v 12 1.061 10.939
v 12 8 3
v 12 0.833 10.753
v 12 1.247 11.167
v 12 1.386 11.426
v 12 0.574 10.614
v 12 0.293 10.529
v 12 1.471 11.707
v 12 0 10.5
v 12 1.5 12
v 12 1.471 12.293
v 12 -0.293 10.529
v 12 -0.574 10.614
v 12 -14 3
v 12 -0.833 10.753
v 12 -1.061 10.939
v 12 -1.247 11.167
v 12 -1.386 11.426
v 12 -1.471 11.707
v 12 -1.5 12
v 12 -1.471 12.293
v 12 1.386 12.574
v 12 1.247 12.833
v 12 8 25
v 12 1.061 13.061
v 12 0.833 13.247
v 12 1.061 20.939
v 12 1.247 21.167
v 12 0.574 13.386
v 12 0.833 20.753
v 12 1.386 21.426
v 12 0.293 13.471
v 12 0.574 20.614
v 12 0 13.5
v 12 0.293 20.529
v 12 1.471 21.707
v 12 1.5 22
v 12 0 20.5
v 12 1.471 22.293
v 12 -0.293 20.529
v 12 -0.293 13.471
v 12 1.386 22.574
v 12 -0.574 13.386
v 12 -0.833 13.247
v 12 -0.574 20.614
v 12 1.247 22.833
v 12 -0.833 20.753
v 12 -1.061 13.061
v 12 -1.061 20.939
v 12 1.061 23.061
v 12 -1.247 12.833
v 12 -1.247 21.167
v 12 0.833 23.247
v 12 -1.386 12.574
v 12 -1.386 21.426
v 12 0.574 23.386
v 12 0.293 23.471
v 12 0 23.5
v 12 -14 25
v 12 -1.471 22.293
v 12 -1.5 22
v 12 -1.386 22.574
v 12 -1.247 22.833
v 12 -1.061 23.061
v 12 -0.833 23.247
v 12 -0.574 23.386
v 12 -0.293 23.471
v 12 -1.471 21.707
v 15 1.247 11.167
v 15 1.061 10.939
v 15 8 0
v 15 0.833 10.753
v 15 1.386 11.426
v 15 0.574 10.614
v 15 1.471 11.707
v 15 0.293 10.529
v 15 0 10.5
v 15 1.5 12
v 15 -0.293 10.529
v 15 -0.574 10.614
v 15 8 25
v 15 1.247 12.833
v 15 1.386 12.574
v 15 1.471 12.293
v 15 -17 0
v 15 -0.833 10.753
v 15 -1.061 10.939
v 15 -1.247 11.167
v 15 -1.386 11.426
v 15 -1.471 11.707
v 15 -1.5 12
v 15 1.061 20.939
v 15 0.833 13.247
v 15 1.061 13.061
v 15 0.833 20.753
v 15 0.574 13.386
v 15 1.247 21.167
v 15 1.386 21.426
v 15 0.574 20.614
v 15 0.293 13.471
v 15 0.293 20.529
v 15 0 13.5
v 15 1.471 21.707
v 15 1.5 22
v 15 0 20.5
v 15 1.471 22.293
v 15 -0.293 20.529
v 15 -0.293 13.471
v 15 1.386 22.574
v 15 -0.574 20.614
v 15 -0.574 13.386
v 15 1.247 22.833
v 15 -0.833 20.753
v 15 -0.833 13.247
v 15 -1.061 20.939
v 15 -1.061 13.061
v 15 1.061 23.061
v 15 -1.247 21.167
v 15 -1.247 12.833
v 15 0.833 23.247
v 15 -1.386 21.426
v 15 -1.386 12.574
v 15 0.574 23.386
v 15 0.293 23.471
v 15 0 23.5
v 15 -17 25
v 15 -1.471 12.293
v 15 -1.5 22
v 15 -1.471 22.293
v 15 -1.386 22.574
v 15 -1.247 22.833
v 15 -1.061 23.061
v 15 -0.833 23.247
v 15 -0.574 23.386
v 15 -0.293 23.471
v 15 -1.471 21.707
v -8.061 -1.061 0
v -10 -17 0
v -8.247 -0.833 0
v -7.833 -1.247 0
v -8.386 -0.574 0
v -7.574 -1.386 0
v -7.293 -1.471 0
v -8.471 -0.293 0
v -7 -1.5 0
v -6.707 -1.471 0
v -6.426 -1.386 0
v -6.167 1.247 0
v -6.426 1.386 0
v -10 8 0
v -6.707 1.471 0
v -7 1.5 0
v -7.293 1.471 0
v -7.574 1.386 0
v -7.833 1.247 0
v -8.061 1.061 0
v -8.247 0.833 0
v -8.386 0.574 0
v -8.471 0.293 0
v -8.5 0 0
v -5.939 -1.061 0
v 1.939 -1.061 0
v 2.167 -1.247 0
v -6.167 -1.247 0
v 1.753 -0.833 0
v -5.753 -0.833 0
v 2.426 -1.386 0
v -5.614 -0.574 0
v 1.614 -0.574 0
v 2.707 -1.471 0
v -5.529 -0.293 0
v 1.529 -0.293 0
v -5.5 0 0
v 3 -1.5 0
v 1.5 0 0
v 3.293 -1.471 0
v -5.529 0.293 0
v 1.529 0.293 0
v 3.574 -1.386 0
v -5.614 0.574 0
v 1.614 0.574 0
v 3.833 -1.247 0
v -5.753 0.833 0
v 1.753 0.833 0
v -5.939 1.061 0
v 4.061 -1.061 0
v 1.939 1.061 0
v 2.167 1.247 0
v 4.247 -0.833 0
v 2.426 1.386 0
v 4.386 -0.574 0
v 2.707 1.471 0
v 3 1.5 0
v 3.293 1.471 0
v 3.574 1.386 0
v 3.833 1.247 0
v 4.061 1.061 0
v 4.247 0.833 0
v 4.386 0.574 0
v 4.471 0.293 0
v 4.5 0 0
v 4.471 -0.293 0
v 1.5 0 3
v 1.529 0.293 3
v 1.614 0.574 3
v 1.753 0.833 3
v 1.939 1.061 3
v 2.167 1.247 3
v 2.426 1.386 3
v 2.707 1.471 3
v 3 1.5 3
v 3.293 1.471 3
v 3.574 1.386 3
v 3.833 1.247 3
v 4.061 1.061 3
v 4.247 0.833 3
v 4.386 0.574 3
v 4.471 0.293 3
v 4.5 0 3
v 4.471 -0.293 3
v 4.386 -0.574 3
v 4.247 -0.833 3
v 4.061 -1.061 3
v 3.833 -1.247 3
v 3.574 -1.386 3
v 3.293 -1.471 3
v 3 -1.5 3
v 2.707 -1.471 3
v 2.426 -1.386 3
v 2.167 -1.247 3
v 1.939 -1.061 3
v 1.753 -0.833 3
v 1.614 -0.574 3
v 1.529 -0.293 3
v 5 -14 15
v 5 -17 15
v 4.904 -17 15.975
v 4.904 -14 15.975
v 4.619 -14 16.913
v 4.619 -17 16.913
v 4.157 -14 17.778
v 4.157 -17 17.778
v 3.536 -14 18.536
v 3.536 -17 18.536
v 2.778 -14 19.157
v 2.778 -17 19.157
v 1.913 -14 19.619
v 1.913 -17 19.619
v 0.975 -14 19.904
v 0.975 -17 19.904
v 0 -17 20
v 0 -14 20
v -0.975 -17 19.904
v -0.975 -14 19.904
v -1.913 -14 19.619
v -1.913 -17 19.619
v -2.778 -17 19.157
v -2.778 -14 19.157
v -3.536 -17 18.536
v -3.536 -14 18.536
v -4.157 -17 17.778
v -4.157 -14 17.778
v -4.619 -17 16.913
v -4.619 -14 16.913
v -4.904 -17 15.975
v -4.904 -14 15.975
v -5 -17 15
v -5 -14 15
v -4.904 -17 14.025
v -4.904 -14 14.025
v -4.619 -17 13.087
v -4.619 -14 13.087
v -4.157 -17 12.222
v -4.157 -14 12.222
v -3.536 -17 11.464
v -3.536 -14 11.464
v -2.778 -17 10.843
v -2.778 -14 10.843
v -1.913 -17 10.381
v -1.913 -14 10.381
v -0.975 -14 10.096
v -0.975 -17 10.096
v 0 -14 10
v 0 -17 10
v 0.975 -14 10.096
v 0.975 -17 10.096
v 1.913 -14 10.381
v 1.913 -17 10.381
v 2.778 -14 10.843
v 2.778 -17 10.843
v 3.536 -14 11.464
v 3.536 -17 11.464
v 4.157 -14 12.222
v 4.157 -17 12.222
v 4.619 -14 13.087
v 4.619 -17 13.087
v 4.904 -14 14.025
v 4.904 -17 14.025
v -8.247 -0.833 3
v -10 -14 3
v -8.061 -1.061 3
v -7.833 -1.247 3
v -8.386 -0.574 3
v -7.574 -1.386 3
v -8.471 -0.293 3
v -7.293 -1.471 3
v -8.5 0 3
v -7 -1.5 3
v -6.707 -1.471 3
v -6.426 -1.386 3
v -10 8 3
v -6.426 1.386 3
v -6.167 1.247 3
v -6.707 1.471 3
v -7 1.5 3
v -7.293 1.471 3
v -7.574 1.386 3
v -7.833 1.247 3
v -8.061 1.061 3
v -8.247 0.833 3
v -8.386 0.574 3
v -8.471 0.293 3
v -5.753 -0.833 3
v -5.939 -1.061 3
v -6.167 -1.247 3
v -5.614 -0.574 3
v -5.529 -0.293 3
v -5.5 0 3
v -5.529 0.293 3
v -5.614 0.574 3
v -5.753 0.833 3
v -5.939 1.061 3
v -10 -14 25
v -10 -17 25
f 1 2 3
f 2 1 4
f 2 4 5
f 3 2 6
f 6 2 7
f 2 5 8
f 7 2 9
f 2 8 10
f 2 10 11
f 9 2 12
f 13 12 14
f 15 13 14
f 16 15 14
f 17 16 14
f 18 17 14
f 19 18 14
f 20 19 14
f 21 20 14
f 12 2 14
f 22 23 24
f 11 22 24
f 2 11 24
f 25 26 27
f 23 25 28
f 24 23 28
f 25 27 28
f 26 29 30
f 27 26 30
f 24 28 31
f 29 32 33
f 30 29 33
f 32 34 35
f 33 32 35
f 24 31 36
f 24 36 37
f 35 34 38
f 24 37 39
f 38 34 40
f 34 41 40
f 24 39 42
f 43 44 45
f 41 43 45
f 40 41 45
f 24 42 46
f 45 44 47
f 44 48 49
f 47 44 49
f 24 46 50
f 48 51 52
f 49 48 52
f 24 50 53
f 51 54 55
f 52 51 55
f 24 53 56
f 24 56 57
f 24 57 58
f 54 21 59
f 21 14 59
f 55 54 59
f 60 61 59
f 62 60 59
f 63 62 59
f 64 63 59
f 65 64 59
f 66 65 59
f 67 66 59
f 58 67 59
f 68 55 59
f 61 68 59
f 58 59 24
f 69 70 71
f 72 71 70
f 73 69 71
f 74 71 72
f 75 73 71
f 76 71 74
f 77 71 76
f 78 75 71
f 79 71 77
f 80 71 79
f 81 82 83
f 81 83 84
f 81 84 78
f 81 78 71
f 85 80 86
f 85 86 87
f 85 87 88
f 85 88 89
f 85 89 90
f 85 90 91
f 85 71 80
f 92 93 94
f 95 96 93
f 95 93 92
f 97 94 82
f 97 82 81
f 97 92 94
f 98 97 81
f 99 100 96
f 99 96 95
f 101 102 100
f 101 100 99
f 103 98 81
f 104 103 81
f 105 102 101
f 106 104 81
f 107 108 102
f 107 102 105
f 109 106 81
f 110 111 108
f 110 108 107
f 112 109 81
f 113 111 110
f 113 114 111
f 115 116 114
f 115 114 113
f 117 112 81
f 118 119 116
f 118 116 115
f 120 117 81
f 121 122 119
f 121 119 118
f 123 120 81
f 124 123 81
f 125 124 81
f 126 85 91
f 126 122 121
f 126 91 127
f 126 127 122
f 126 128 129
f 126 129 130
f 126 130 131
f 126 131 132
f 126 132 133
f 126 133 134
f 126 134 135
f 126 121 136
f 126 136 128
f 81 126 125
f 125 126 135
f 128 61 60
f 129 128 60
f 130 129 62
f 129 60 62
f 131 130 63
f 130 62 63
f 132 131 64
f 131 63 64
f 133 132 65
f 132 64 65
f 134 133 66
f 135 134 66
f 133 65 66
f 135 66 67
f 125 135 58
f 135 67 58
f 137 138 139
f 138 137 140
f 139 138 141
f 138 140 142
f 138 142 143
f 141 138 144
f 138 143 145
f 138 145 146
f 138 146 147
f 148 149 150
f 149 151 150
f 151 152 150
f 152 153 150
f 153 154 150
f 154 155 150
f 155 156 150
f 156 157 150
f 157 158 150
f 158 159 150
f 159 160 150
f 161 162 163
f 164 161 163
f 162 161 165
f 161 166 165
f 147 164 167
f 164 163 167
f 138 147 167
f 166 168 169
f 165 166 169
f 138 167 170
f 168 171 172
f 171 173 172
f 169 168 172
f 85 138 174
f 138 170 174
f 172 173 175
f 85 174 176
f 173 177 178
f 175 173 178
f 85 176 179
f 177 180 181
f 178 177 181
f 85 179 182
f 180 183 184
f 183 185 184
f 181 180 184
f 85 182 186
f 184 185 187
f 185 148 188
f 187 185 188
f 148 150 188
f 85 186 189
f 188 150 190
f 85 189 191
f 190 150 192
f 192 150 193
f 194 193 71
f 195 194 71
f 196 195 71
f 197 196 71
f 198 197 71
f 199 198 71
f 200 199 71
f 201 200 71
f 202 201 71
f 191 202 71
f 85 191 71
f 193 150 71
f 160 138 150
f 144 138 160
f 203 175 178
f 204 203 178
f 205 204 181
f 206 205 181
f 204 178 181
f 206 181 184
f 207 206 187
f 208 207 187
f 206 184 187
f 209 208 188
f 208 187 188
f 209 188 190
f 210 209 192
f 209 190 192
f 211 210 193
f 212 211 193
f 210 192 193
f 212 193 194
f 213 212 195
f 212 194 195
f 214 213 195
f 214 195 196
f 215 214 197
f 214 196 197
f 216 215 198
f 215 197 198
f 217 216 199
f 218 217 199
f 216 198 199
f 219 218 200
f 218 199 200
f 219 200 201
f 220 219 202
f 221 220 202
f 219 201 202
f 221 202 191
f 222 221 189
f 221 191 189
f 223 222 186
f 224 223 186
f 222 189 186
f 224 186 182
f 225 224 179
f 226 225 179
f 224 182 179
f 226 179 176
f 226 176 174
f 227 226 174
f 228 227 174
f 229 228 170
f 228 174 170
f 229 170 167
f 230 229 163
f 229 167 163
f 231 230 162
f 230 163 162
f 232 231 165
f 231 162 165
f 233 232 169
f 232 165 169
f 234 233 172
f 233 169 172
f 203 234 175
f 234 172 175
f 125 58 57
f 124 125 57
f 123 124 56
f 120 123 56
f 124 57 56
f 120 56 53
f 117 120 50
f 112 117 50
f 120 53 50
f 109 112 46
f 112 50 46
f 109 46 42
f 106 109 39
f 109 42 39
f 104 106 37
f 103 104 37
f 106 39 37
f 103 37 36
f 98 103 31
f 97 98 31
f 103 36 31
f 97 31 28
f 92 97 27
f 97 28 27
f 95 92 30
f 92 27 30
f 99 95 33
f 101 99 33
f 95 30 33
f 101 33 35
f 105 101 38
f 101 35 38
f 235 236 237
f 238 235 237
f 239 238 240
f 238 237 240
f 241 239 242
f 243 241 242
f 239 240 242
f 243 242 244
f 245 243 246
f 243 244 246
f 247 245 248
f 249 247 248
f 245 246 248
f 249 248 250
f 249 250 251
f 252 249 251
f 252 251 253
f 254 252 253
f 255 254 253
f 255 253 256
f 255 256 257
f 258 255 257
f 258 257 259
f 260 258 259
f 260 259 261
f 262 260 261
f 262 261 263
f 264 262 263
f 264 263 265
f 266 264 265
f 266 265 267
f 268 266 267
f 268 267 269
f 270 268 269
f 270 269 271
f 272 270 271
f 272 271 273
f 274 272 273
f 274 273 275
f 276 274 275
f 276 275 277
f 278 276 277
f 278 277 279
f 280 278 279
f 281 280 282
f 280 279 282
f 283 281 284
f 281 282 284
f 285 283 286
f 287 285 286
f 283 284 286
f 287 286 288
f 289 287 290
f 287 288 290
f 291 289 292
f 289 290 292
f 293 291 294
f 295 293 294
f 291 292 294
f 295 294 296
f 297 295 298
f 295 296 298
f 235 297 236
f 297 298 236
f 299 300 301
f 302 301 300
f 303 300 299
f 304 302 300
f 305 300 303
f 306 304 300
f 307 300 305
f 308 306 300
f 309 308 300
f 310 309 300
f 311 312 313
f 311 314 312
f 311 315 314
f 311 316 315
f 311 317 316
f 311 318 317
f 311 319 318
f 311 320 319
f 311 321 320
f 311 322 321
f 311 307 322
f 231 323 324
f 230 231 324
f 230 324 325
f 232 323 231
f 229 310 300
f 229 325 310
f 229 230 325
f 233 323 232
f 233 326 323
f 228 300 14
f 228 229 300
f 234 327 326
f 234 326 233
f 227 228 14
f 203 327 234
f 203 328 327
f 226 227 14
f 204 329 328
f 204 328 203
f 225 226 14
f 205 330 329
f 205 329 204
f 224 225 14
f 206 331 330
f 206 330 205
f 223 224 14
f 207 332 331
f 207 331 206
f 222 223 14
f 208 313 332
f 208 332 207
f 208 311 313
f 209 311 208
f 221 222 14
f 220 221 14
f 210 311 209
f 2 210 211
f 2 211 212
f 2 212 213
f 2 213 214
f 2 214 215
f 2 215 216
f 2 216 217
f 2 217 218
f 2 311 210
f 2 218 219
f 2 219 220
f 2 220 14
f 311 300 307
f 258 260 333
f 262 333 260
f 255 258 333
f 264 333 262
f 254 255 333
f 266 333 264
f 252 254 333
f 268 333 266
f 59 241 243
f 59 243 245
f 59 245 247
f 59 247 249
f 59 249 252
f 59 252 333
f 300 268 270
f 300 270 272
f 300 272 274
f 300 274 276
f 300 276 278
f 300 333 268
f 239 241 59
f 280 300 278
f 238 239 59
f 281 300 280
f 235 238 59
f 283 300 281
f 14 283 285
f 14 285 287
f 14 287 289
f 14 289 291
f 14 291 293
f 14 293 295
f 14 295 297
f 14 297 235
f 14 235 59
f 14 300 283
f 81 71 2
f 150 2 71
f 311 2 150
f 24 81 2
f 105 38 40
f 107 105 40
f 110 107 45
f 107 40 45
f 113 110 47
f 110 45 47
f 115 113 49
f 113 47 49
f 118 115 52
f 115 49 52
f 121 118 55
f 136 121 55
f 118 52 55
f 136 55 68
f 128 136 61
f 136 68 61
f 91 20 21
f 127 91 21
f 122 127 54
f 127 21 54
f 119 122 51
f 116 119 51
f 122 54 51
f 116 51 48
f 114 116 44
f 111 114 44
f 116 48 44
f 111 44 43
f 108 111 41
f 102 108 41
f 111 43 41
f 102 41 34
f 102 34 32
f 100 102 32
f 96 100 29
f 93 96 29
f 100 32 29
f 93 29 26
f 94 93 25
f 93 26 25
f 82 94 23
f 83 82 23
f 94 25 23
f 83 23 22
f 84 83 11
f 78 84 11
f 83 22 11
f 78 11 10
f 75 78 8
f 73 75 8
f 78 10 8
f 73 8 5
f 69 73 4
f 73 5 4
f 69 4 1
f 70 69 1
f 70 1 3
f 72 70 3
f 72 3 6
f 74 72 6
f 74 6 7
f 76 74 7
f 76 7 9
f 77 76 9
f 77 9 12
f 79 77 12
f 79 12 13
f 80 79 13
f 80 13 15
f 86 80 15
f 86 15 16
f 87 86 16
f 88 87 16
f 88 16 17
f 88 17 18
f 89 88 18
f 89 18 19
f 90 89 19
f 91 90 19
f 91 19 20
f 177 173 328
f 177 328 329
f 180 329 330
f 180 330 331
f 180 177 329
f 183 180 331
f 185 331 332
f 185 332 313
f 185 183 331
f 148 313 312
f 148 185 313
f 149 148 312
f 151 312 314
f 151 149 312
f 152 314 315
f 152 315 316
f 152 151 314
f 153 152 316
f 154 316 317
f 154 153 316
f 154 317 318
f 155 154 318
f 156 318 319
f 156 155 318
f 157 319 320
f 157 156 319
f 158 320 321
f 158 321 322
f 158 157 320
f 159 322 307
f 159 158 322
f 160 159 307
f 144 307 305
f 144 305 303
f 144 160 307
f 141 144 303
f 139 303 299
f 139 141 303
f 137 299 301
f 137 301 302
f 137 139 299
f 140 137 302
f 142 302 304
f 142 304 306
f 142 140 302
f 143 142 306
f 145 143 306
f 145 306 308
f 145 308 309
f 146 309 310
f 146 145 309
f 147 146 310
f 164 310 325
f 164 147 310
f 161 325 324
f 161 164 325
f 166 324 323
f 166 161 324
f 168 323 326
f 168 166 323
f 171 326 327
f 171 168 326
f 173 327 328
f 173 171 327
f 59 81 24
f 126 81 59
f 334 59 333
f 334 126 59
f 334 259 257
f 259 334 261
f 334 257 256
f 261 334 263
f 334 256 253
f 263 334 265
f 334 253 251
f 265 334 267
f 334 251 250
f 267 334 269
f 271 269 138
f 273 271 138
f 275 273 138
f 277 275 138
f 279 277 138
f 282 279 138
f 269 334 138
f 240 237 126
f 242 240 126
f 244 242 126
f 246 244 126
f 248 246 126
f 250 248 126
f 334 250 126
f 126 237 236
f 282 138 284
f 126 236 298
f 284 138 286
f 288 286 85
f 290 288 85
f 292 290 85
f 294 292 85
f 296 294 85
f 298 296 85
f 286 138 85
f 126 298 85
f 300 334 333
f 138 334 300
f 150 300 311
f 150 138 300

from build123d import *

# Parameters (mm, degrees)
F0_W      = 25
F0_H      = 25
F0_R      = 1.5
F1_DEPTH  = 3
F2_DEPTH  = 3
F3_W      = 25
F3_H      = 3
F4_DEPTH  = 22
F5_W      = 3
F5_H      = 22
F6_DEPTH  = 22
F8_DEPTH  = 25
F9_R      = 5
F10_DEPTH = 25


with BuildPart() as f1:
    # F0 (on Top) → F1 (new body)
    with BuildSketch(Plane.XY):
        with Locations((2.5, -4.5)):
            Rectangle(F0_W, F0_H)
        with Locations((-7, 0)):
            Circle(F0_R, mode=Mode.SUBTRACT)
        with BuildLine():
            ThreePointArc((4.5, 0), (3, -1.5), (1.5, 0))
            ThreePointArc((1.5, 0), (3, 1.5), (4.5, 0))
        make_face(mode=Mode.SUBTRACT)
    extrude(amount=F1_DEPTH)

    # F0 (on Top) → F2 (join)
    with BuildSketch(Plane.XY):
        with Locations((2.5, -4.5)):
            Rectangle(F0_W, F0_H)
        with Locations((-7, 0)):
            Circle(F0_R, mode=Mode.SUBTRACT)
        with BuildLine():
            ThreePointArc((4.5, 0), (3, -1.5), (1.5, 0))
            ThreePointArc((1.5, 0), (3, 1.5), (4.5, 0))
        make_face(mode=Mode.SUBTRACT)
    extrude(amount=F2_DEPTH)

    # F3 (on face) → F4 (join)
    with BuildSketch(Plane.XY.offset(3)):
        with Locations((2.5, -15.5)):
            Rectangle(F3_W, F3_H)
    extrude(amount=F4_DEPTH)

    # F5 (on face) → F6 (join)
    with BuildSketch(Plane(origin=(0, -14, 0), x_dir=(-1, 0, 0), z_dir=(0, 1, 0))):
        with Locations((-13.5, 14)):
            Rectangle(F5_W, F5_H)
    extrude(amount=F6_DEPTH)

    # F7 (on face) → F8 (cut)
    with BuildSketch(Plane(origin=(12, 0, 0), x_dir=(0, -1, 0), z_dir=(-1, 0, 0))):
        with BuildLine():
            ThreePointArc((1.5, 12), (1.06066, 13.06066), (0, 13.5))
            ThreePointArc((0, 13.5), (-1.06066, 10.93934), (1.5, 12))
        make_face()
        with BuildLine():
            Line((0, 22), (0, 23.5))
            ThreePointArc((0, 23.5), (-1.5, 22), (0, 20.5))
            Line((0, 20.5), (0, 22))
        make_face()
        with BuildLine():
            ThreePointArc((0, 20.5), (1.06066, 20.93934), (1.5, 22))
            ThreePointArc((1.5, 22), (1.06066, 23.06066), (0, 23.5))
            Line((0, 23.5), (0, 22))
            Line((0, 22), (0, 20.5))
        make_face()
    extrude(amount=-F8_DEPTH, mode=Mode.SUBTRACT)

    # F9 (on face) → F10 (cut)
    with BuildSketch(Plane.XZ.offset(17)):
        with Locations((0, 15)):
            Circle(F9_R)
    extrude(amount=-F10_DEPTH, mode=Mode.SUBTRACT)


solid = f1.part
